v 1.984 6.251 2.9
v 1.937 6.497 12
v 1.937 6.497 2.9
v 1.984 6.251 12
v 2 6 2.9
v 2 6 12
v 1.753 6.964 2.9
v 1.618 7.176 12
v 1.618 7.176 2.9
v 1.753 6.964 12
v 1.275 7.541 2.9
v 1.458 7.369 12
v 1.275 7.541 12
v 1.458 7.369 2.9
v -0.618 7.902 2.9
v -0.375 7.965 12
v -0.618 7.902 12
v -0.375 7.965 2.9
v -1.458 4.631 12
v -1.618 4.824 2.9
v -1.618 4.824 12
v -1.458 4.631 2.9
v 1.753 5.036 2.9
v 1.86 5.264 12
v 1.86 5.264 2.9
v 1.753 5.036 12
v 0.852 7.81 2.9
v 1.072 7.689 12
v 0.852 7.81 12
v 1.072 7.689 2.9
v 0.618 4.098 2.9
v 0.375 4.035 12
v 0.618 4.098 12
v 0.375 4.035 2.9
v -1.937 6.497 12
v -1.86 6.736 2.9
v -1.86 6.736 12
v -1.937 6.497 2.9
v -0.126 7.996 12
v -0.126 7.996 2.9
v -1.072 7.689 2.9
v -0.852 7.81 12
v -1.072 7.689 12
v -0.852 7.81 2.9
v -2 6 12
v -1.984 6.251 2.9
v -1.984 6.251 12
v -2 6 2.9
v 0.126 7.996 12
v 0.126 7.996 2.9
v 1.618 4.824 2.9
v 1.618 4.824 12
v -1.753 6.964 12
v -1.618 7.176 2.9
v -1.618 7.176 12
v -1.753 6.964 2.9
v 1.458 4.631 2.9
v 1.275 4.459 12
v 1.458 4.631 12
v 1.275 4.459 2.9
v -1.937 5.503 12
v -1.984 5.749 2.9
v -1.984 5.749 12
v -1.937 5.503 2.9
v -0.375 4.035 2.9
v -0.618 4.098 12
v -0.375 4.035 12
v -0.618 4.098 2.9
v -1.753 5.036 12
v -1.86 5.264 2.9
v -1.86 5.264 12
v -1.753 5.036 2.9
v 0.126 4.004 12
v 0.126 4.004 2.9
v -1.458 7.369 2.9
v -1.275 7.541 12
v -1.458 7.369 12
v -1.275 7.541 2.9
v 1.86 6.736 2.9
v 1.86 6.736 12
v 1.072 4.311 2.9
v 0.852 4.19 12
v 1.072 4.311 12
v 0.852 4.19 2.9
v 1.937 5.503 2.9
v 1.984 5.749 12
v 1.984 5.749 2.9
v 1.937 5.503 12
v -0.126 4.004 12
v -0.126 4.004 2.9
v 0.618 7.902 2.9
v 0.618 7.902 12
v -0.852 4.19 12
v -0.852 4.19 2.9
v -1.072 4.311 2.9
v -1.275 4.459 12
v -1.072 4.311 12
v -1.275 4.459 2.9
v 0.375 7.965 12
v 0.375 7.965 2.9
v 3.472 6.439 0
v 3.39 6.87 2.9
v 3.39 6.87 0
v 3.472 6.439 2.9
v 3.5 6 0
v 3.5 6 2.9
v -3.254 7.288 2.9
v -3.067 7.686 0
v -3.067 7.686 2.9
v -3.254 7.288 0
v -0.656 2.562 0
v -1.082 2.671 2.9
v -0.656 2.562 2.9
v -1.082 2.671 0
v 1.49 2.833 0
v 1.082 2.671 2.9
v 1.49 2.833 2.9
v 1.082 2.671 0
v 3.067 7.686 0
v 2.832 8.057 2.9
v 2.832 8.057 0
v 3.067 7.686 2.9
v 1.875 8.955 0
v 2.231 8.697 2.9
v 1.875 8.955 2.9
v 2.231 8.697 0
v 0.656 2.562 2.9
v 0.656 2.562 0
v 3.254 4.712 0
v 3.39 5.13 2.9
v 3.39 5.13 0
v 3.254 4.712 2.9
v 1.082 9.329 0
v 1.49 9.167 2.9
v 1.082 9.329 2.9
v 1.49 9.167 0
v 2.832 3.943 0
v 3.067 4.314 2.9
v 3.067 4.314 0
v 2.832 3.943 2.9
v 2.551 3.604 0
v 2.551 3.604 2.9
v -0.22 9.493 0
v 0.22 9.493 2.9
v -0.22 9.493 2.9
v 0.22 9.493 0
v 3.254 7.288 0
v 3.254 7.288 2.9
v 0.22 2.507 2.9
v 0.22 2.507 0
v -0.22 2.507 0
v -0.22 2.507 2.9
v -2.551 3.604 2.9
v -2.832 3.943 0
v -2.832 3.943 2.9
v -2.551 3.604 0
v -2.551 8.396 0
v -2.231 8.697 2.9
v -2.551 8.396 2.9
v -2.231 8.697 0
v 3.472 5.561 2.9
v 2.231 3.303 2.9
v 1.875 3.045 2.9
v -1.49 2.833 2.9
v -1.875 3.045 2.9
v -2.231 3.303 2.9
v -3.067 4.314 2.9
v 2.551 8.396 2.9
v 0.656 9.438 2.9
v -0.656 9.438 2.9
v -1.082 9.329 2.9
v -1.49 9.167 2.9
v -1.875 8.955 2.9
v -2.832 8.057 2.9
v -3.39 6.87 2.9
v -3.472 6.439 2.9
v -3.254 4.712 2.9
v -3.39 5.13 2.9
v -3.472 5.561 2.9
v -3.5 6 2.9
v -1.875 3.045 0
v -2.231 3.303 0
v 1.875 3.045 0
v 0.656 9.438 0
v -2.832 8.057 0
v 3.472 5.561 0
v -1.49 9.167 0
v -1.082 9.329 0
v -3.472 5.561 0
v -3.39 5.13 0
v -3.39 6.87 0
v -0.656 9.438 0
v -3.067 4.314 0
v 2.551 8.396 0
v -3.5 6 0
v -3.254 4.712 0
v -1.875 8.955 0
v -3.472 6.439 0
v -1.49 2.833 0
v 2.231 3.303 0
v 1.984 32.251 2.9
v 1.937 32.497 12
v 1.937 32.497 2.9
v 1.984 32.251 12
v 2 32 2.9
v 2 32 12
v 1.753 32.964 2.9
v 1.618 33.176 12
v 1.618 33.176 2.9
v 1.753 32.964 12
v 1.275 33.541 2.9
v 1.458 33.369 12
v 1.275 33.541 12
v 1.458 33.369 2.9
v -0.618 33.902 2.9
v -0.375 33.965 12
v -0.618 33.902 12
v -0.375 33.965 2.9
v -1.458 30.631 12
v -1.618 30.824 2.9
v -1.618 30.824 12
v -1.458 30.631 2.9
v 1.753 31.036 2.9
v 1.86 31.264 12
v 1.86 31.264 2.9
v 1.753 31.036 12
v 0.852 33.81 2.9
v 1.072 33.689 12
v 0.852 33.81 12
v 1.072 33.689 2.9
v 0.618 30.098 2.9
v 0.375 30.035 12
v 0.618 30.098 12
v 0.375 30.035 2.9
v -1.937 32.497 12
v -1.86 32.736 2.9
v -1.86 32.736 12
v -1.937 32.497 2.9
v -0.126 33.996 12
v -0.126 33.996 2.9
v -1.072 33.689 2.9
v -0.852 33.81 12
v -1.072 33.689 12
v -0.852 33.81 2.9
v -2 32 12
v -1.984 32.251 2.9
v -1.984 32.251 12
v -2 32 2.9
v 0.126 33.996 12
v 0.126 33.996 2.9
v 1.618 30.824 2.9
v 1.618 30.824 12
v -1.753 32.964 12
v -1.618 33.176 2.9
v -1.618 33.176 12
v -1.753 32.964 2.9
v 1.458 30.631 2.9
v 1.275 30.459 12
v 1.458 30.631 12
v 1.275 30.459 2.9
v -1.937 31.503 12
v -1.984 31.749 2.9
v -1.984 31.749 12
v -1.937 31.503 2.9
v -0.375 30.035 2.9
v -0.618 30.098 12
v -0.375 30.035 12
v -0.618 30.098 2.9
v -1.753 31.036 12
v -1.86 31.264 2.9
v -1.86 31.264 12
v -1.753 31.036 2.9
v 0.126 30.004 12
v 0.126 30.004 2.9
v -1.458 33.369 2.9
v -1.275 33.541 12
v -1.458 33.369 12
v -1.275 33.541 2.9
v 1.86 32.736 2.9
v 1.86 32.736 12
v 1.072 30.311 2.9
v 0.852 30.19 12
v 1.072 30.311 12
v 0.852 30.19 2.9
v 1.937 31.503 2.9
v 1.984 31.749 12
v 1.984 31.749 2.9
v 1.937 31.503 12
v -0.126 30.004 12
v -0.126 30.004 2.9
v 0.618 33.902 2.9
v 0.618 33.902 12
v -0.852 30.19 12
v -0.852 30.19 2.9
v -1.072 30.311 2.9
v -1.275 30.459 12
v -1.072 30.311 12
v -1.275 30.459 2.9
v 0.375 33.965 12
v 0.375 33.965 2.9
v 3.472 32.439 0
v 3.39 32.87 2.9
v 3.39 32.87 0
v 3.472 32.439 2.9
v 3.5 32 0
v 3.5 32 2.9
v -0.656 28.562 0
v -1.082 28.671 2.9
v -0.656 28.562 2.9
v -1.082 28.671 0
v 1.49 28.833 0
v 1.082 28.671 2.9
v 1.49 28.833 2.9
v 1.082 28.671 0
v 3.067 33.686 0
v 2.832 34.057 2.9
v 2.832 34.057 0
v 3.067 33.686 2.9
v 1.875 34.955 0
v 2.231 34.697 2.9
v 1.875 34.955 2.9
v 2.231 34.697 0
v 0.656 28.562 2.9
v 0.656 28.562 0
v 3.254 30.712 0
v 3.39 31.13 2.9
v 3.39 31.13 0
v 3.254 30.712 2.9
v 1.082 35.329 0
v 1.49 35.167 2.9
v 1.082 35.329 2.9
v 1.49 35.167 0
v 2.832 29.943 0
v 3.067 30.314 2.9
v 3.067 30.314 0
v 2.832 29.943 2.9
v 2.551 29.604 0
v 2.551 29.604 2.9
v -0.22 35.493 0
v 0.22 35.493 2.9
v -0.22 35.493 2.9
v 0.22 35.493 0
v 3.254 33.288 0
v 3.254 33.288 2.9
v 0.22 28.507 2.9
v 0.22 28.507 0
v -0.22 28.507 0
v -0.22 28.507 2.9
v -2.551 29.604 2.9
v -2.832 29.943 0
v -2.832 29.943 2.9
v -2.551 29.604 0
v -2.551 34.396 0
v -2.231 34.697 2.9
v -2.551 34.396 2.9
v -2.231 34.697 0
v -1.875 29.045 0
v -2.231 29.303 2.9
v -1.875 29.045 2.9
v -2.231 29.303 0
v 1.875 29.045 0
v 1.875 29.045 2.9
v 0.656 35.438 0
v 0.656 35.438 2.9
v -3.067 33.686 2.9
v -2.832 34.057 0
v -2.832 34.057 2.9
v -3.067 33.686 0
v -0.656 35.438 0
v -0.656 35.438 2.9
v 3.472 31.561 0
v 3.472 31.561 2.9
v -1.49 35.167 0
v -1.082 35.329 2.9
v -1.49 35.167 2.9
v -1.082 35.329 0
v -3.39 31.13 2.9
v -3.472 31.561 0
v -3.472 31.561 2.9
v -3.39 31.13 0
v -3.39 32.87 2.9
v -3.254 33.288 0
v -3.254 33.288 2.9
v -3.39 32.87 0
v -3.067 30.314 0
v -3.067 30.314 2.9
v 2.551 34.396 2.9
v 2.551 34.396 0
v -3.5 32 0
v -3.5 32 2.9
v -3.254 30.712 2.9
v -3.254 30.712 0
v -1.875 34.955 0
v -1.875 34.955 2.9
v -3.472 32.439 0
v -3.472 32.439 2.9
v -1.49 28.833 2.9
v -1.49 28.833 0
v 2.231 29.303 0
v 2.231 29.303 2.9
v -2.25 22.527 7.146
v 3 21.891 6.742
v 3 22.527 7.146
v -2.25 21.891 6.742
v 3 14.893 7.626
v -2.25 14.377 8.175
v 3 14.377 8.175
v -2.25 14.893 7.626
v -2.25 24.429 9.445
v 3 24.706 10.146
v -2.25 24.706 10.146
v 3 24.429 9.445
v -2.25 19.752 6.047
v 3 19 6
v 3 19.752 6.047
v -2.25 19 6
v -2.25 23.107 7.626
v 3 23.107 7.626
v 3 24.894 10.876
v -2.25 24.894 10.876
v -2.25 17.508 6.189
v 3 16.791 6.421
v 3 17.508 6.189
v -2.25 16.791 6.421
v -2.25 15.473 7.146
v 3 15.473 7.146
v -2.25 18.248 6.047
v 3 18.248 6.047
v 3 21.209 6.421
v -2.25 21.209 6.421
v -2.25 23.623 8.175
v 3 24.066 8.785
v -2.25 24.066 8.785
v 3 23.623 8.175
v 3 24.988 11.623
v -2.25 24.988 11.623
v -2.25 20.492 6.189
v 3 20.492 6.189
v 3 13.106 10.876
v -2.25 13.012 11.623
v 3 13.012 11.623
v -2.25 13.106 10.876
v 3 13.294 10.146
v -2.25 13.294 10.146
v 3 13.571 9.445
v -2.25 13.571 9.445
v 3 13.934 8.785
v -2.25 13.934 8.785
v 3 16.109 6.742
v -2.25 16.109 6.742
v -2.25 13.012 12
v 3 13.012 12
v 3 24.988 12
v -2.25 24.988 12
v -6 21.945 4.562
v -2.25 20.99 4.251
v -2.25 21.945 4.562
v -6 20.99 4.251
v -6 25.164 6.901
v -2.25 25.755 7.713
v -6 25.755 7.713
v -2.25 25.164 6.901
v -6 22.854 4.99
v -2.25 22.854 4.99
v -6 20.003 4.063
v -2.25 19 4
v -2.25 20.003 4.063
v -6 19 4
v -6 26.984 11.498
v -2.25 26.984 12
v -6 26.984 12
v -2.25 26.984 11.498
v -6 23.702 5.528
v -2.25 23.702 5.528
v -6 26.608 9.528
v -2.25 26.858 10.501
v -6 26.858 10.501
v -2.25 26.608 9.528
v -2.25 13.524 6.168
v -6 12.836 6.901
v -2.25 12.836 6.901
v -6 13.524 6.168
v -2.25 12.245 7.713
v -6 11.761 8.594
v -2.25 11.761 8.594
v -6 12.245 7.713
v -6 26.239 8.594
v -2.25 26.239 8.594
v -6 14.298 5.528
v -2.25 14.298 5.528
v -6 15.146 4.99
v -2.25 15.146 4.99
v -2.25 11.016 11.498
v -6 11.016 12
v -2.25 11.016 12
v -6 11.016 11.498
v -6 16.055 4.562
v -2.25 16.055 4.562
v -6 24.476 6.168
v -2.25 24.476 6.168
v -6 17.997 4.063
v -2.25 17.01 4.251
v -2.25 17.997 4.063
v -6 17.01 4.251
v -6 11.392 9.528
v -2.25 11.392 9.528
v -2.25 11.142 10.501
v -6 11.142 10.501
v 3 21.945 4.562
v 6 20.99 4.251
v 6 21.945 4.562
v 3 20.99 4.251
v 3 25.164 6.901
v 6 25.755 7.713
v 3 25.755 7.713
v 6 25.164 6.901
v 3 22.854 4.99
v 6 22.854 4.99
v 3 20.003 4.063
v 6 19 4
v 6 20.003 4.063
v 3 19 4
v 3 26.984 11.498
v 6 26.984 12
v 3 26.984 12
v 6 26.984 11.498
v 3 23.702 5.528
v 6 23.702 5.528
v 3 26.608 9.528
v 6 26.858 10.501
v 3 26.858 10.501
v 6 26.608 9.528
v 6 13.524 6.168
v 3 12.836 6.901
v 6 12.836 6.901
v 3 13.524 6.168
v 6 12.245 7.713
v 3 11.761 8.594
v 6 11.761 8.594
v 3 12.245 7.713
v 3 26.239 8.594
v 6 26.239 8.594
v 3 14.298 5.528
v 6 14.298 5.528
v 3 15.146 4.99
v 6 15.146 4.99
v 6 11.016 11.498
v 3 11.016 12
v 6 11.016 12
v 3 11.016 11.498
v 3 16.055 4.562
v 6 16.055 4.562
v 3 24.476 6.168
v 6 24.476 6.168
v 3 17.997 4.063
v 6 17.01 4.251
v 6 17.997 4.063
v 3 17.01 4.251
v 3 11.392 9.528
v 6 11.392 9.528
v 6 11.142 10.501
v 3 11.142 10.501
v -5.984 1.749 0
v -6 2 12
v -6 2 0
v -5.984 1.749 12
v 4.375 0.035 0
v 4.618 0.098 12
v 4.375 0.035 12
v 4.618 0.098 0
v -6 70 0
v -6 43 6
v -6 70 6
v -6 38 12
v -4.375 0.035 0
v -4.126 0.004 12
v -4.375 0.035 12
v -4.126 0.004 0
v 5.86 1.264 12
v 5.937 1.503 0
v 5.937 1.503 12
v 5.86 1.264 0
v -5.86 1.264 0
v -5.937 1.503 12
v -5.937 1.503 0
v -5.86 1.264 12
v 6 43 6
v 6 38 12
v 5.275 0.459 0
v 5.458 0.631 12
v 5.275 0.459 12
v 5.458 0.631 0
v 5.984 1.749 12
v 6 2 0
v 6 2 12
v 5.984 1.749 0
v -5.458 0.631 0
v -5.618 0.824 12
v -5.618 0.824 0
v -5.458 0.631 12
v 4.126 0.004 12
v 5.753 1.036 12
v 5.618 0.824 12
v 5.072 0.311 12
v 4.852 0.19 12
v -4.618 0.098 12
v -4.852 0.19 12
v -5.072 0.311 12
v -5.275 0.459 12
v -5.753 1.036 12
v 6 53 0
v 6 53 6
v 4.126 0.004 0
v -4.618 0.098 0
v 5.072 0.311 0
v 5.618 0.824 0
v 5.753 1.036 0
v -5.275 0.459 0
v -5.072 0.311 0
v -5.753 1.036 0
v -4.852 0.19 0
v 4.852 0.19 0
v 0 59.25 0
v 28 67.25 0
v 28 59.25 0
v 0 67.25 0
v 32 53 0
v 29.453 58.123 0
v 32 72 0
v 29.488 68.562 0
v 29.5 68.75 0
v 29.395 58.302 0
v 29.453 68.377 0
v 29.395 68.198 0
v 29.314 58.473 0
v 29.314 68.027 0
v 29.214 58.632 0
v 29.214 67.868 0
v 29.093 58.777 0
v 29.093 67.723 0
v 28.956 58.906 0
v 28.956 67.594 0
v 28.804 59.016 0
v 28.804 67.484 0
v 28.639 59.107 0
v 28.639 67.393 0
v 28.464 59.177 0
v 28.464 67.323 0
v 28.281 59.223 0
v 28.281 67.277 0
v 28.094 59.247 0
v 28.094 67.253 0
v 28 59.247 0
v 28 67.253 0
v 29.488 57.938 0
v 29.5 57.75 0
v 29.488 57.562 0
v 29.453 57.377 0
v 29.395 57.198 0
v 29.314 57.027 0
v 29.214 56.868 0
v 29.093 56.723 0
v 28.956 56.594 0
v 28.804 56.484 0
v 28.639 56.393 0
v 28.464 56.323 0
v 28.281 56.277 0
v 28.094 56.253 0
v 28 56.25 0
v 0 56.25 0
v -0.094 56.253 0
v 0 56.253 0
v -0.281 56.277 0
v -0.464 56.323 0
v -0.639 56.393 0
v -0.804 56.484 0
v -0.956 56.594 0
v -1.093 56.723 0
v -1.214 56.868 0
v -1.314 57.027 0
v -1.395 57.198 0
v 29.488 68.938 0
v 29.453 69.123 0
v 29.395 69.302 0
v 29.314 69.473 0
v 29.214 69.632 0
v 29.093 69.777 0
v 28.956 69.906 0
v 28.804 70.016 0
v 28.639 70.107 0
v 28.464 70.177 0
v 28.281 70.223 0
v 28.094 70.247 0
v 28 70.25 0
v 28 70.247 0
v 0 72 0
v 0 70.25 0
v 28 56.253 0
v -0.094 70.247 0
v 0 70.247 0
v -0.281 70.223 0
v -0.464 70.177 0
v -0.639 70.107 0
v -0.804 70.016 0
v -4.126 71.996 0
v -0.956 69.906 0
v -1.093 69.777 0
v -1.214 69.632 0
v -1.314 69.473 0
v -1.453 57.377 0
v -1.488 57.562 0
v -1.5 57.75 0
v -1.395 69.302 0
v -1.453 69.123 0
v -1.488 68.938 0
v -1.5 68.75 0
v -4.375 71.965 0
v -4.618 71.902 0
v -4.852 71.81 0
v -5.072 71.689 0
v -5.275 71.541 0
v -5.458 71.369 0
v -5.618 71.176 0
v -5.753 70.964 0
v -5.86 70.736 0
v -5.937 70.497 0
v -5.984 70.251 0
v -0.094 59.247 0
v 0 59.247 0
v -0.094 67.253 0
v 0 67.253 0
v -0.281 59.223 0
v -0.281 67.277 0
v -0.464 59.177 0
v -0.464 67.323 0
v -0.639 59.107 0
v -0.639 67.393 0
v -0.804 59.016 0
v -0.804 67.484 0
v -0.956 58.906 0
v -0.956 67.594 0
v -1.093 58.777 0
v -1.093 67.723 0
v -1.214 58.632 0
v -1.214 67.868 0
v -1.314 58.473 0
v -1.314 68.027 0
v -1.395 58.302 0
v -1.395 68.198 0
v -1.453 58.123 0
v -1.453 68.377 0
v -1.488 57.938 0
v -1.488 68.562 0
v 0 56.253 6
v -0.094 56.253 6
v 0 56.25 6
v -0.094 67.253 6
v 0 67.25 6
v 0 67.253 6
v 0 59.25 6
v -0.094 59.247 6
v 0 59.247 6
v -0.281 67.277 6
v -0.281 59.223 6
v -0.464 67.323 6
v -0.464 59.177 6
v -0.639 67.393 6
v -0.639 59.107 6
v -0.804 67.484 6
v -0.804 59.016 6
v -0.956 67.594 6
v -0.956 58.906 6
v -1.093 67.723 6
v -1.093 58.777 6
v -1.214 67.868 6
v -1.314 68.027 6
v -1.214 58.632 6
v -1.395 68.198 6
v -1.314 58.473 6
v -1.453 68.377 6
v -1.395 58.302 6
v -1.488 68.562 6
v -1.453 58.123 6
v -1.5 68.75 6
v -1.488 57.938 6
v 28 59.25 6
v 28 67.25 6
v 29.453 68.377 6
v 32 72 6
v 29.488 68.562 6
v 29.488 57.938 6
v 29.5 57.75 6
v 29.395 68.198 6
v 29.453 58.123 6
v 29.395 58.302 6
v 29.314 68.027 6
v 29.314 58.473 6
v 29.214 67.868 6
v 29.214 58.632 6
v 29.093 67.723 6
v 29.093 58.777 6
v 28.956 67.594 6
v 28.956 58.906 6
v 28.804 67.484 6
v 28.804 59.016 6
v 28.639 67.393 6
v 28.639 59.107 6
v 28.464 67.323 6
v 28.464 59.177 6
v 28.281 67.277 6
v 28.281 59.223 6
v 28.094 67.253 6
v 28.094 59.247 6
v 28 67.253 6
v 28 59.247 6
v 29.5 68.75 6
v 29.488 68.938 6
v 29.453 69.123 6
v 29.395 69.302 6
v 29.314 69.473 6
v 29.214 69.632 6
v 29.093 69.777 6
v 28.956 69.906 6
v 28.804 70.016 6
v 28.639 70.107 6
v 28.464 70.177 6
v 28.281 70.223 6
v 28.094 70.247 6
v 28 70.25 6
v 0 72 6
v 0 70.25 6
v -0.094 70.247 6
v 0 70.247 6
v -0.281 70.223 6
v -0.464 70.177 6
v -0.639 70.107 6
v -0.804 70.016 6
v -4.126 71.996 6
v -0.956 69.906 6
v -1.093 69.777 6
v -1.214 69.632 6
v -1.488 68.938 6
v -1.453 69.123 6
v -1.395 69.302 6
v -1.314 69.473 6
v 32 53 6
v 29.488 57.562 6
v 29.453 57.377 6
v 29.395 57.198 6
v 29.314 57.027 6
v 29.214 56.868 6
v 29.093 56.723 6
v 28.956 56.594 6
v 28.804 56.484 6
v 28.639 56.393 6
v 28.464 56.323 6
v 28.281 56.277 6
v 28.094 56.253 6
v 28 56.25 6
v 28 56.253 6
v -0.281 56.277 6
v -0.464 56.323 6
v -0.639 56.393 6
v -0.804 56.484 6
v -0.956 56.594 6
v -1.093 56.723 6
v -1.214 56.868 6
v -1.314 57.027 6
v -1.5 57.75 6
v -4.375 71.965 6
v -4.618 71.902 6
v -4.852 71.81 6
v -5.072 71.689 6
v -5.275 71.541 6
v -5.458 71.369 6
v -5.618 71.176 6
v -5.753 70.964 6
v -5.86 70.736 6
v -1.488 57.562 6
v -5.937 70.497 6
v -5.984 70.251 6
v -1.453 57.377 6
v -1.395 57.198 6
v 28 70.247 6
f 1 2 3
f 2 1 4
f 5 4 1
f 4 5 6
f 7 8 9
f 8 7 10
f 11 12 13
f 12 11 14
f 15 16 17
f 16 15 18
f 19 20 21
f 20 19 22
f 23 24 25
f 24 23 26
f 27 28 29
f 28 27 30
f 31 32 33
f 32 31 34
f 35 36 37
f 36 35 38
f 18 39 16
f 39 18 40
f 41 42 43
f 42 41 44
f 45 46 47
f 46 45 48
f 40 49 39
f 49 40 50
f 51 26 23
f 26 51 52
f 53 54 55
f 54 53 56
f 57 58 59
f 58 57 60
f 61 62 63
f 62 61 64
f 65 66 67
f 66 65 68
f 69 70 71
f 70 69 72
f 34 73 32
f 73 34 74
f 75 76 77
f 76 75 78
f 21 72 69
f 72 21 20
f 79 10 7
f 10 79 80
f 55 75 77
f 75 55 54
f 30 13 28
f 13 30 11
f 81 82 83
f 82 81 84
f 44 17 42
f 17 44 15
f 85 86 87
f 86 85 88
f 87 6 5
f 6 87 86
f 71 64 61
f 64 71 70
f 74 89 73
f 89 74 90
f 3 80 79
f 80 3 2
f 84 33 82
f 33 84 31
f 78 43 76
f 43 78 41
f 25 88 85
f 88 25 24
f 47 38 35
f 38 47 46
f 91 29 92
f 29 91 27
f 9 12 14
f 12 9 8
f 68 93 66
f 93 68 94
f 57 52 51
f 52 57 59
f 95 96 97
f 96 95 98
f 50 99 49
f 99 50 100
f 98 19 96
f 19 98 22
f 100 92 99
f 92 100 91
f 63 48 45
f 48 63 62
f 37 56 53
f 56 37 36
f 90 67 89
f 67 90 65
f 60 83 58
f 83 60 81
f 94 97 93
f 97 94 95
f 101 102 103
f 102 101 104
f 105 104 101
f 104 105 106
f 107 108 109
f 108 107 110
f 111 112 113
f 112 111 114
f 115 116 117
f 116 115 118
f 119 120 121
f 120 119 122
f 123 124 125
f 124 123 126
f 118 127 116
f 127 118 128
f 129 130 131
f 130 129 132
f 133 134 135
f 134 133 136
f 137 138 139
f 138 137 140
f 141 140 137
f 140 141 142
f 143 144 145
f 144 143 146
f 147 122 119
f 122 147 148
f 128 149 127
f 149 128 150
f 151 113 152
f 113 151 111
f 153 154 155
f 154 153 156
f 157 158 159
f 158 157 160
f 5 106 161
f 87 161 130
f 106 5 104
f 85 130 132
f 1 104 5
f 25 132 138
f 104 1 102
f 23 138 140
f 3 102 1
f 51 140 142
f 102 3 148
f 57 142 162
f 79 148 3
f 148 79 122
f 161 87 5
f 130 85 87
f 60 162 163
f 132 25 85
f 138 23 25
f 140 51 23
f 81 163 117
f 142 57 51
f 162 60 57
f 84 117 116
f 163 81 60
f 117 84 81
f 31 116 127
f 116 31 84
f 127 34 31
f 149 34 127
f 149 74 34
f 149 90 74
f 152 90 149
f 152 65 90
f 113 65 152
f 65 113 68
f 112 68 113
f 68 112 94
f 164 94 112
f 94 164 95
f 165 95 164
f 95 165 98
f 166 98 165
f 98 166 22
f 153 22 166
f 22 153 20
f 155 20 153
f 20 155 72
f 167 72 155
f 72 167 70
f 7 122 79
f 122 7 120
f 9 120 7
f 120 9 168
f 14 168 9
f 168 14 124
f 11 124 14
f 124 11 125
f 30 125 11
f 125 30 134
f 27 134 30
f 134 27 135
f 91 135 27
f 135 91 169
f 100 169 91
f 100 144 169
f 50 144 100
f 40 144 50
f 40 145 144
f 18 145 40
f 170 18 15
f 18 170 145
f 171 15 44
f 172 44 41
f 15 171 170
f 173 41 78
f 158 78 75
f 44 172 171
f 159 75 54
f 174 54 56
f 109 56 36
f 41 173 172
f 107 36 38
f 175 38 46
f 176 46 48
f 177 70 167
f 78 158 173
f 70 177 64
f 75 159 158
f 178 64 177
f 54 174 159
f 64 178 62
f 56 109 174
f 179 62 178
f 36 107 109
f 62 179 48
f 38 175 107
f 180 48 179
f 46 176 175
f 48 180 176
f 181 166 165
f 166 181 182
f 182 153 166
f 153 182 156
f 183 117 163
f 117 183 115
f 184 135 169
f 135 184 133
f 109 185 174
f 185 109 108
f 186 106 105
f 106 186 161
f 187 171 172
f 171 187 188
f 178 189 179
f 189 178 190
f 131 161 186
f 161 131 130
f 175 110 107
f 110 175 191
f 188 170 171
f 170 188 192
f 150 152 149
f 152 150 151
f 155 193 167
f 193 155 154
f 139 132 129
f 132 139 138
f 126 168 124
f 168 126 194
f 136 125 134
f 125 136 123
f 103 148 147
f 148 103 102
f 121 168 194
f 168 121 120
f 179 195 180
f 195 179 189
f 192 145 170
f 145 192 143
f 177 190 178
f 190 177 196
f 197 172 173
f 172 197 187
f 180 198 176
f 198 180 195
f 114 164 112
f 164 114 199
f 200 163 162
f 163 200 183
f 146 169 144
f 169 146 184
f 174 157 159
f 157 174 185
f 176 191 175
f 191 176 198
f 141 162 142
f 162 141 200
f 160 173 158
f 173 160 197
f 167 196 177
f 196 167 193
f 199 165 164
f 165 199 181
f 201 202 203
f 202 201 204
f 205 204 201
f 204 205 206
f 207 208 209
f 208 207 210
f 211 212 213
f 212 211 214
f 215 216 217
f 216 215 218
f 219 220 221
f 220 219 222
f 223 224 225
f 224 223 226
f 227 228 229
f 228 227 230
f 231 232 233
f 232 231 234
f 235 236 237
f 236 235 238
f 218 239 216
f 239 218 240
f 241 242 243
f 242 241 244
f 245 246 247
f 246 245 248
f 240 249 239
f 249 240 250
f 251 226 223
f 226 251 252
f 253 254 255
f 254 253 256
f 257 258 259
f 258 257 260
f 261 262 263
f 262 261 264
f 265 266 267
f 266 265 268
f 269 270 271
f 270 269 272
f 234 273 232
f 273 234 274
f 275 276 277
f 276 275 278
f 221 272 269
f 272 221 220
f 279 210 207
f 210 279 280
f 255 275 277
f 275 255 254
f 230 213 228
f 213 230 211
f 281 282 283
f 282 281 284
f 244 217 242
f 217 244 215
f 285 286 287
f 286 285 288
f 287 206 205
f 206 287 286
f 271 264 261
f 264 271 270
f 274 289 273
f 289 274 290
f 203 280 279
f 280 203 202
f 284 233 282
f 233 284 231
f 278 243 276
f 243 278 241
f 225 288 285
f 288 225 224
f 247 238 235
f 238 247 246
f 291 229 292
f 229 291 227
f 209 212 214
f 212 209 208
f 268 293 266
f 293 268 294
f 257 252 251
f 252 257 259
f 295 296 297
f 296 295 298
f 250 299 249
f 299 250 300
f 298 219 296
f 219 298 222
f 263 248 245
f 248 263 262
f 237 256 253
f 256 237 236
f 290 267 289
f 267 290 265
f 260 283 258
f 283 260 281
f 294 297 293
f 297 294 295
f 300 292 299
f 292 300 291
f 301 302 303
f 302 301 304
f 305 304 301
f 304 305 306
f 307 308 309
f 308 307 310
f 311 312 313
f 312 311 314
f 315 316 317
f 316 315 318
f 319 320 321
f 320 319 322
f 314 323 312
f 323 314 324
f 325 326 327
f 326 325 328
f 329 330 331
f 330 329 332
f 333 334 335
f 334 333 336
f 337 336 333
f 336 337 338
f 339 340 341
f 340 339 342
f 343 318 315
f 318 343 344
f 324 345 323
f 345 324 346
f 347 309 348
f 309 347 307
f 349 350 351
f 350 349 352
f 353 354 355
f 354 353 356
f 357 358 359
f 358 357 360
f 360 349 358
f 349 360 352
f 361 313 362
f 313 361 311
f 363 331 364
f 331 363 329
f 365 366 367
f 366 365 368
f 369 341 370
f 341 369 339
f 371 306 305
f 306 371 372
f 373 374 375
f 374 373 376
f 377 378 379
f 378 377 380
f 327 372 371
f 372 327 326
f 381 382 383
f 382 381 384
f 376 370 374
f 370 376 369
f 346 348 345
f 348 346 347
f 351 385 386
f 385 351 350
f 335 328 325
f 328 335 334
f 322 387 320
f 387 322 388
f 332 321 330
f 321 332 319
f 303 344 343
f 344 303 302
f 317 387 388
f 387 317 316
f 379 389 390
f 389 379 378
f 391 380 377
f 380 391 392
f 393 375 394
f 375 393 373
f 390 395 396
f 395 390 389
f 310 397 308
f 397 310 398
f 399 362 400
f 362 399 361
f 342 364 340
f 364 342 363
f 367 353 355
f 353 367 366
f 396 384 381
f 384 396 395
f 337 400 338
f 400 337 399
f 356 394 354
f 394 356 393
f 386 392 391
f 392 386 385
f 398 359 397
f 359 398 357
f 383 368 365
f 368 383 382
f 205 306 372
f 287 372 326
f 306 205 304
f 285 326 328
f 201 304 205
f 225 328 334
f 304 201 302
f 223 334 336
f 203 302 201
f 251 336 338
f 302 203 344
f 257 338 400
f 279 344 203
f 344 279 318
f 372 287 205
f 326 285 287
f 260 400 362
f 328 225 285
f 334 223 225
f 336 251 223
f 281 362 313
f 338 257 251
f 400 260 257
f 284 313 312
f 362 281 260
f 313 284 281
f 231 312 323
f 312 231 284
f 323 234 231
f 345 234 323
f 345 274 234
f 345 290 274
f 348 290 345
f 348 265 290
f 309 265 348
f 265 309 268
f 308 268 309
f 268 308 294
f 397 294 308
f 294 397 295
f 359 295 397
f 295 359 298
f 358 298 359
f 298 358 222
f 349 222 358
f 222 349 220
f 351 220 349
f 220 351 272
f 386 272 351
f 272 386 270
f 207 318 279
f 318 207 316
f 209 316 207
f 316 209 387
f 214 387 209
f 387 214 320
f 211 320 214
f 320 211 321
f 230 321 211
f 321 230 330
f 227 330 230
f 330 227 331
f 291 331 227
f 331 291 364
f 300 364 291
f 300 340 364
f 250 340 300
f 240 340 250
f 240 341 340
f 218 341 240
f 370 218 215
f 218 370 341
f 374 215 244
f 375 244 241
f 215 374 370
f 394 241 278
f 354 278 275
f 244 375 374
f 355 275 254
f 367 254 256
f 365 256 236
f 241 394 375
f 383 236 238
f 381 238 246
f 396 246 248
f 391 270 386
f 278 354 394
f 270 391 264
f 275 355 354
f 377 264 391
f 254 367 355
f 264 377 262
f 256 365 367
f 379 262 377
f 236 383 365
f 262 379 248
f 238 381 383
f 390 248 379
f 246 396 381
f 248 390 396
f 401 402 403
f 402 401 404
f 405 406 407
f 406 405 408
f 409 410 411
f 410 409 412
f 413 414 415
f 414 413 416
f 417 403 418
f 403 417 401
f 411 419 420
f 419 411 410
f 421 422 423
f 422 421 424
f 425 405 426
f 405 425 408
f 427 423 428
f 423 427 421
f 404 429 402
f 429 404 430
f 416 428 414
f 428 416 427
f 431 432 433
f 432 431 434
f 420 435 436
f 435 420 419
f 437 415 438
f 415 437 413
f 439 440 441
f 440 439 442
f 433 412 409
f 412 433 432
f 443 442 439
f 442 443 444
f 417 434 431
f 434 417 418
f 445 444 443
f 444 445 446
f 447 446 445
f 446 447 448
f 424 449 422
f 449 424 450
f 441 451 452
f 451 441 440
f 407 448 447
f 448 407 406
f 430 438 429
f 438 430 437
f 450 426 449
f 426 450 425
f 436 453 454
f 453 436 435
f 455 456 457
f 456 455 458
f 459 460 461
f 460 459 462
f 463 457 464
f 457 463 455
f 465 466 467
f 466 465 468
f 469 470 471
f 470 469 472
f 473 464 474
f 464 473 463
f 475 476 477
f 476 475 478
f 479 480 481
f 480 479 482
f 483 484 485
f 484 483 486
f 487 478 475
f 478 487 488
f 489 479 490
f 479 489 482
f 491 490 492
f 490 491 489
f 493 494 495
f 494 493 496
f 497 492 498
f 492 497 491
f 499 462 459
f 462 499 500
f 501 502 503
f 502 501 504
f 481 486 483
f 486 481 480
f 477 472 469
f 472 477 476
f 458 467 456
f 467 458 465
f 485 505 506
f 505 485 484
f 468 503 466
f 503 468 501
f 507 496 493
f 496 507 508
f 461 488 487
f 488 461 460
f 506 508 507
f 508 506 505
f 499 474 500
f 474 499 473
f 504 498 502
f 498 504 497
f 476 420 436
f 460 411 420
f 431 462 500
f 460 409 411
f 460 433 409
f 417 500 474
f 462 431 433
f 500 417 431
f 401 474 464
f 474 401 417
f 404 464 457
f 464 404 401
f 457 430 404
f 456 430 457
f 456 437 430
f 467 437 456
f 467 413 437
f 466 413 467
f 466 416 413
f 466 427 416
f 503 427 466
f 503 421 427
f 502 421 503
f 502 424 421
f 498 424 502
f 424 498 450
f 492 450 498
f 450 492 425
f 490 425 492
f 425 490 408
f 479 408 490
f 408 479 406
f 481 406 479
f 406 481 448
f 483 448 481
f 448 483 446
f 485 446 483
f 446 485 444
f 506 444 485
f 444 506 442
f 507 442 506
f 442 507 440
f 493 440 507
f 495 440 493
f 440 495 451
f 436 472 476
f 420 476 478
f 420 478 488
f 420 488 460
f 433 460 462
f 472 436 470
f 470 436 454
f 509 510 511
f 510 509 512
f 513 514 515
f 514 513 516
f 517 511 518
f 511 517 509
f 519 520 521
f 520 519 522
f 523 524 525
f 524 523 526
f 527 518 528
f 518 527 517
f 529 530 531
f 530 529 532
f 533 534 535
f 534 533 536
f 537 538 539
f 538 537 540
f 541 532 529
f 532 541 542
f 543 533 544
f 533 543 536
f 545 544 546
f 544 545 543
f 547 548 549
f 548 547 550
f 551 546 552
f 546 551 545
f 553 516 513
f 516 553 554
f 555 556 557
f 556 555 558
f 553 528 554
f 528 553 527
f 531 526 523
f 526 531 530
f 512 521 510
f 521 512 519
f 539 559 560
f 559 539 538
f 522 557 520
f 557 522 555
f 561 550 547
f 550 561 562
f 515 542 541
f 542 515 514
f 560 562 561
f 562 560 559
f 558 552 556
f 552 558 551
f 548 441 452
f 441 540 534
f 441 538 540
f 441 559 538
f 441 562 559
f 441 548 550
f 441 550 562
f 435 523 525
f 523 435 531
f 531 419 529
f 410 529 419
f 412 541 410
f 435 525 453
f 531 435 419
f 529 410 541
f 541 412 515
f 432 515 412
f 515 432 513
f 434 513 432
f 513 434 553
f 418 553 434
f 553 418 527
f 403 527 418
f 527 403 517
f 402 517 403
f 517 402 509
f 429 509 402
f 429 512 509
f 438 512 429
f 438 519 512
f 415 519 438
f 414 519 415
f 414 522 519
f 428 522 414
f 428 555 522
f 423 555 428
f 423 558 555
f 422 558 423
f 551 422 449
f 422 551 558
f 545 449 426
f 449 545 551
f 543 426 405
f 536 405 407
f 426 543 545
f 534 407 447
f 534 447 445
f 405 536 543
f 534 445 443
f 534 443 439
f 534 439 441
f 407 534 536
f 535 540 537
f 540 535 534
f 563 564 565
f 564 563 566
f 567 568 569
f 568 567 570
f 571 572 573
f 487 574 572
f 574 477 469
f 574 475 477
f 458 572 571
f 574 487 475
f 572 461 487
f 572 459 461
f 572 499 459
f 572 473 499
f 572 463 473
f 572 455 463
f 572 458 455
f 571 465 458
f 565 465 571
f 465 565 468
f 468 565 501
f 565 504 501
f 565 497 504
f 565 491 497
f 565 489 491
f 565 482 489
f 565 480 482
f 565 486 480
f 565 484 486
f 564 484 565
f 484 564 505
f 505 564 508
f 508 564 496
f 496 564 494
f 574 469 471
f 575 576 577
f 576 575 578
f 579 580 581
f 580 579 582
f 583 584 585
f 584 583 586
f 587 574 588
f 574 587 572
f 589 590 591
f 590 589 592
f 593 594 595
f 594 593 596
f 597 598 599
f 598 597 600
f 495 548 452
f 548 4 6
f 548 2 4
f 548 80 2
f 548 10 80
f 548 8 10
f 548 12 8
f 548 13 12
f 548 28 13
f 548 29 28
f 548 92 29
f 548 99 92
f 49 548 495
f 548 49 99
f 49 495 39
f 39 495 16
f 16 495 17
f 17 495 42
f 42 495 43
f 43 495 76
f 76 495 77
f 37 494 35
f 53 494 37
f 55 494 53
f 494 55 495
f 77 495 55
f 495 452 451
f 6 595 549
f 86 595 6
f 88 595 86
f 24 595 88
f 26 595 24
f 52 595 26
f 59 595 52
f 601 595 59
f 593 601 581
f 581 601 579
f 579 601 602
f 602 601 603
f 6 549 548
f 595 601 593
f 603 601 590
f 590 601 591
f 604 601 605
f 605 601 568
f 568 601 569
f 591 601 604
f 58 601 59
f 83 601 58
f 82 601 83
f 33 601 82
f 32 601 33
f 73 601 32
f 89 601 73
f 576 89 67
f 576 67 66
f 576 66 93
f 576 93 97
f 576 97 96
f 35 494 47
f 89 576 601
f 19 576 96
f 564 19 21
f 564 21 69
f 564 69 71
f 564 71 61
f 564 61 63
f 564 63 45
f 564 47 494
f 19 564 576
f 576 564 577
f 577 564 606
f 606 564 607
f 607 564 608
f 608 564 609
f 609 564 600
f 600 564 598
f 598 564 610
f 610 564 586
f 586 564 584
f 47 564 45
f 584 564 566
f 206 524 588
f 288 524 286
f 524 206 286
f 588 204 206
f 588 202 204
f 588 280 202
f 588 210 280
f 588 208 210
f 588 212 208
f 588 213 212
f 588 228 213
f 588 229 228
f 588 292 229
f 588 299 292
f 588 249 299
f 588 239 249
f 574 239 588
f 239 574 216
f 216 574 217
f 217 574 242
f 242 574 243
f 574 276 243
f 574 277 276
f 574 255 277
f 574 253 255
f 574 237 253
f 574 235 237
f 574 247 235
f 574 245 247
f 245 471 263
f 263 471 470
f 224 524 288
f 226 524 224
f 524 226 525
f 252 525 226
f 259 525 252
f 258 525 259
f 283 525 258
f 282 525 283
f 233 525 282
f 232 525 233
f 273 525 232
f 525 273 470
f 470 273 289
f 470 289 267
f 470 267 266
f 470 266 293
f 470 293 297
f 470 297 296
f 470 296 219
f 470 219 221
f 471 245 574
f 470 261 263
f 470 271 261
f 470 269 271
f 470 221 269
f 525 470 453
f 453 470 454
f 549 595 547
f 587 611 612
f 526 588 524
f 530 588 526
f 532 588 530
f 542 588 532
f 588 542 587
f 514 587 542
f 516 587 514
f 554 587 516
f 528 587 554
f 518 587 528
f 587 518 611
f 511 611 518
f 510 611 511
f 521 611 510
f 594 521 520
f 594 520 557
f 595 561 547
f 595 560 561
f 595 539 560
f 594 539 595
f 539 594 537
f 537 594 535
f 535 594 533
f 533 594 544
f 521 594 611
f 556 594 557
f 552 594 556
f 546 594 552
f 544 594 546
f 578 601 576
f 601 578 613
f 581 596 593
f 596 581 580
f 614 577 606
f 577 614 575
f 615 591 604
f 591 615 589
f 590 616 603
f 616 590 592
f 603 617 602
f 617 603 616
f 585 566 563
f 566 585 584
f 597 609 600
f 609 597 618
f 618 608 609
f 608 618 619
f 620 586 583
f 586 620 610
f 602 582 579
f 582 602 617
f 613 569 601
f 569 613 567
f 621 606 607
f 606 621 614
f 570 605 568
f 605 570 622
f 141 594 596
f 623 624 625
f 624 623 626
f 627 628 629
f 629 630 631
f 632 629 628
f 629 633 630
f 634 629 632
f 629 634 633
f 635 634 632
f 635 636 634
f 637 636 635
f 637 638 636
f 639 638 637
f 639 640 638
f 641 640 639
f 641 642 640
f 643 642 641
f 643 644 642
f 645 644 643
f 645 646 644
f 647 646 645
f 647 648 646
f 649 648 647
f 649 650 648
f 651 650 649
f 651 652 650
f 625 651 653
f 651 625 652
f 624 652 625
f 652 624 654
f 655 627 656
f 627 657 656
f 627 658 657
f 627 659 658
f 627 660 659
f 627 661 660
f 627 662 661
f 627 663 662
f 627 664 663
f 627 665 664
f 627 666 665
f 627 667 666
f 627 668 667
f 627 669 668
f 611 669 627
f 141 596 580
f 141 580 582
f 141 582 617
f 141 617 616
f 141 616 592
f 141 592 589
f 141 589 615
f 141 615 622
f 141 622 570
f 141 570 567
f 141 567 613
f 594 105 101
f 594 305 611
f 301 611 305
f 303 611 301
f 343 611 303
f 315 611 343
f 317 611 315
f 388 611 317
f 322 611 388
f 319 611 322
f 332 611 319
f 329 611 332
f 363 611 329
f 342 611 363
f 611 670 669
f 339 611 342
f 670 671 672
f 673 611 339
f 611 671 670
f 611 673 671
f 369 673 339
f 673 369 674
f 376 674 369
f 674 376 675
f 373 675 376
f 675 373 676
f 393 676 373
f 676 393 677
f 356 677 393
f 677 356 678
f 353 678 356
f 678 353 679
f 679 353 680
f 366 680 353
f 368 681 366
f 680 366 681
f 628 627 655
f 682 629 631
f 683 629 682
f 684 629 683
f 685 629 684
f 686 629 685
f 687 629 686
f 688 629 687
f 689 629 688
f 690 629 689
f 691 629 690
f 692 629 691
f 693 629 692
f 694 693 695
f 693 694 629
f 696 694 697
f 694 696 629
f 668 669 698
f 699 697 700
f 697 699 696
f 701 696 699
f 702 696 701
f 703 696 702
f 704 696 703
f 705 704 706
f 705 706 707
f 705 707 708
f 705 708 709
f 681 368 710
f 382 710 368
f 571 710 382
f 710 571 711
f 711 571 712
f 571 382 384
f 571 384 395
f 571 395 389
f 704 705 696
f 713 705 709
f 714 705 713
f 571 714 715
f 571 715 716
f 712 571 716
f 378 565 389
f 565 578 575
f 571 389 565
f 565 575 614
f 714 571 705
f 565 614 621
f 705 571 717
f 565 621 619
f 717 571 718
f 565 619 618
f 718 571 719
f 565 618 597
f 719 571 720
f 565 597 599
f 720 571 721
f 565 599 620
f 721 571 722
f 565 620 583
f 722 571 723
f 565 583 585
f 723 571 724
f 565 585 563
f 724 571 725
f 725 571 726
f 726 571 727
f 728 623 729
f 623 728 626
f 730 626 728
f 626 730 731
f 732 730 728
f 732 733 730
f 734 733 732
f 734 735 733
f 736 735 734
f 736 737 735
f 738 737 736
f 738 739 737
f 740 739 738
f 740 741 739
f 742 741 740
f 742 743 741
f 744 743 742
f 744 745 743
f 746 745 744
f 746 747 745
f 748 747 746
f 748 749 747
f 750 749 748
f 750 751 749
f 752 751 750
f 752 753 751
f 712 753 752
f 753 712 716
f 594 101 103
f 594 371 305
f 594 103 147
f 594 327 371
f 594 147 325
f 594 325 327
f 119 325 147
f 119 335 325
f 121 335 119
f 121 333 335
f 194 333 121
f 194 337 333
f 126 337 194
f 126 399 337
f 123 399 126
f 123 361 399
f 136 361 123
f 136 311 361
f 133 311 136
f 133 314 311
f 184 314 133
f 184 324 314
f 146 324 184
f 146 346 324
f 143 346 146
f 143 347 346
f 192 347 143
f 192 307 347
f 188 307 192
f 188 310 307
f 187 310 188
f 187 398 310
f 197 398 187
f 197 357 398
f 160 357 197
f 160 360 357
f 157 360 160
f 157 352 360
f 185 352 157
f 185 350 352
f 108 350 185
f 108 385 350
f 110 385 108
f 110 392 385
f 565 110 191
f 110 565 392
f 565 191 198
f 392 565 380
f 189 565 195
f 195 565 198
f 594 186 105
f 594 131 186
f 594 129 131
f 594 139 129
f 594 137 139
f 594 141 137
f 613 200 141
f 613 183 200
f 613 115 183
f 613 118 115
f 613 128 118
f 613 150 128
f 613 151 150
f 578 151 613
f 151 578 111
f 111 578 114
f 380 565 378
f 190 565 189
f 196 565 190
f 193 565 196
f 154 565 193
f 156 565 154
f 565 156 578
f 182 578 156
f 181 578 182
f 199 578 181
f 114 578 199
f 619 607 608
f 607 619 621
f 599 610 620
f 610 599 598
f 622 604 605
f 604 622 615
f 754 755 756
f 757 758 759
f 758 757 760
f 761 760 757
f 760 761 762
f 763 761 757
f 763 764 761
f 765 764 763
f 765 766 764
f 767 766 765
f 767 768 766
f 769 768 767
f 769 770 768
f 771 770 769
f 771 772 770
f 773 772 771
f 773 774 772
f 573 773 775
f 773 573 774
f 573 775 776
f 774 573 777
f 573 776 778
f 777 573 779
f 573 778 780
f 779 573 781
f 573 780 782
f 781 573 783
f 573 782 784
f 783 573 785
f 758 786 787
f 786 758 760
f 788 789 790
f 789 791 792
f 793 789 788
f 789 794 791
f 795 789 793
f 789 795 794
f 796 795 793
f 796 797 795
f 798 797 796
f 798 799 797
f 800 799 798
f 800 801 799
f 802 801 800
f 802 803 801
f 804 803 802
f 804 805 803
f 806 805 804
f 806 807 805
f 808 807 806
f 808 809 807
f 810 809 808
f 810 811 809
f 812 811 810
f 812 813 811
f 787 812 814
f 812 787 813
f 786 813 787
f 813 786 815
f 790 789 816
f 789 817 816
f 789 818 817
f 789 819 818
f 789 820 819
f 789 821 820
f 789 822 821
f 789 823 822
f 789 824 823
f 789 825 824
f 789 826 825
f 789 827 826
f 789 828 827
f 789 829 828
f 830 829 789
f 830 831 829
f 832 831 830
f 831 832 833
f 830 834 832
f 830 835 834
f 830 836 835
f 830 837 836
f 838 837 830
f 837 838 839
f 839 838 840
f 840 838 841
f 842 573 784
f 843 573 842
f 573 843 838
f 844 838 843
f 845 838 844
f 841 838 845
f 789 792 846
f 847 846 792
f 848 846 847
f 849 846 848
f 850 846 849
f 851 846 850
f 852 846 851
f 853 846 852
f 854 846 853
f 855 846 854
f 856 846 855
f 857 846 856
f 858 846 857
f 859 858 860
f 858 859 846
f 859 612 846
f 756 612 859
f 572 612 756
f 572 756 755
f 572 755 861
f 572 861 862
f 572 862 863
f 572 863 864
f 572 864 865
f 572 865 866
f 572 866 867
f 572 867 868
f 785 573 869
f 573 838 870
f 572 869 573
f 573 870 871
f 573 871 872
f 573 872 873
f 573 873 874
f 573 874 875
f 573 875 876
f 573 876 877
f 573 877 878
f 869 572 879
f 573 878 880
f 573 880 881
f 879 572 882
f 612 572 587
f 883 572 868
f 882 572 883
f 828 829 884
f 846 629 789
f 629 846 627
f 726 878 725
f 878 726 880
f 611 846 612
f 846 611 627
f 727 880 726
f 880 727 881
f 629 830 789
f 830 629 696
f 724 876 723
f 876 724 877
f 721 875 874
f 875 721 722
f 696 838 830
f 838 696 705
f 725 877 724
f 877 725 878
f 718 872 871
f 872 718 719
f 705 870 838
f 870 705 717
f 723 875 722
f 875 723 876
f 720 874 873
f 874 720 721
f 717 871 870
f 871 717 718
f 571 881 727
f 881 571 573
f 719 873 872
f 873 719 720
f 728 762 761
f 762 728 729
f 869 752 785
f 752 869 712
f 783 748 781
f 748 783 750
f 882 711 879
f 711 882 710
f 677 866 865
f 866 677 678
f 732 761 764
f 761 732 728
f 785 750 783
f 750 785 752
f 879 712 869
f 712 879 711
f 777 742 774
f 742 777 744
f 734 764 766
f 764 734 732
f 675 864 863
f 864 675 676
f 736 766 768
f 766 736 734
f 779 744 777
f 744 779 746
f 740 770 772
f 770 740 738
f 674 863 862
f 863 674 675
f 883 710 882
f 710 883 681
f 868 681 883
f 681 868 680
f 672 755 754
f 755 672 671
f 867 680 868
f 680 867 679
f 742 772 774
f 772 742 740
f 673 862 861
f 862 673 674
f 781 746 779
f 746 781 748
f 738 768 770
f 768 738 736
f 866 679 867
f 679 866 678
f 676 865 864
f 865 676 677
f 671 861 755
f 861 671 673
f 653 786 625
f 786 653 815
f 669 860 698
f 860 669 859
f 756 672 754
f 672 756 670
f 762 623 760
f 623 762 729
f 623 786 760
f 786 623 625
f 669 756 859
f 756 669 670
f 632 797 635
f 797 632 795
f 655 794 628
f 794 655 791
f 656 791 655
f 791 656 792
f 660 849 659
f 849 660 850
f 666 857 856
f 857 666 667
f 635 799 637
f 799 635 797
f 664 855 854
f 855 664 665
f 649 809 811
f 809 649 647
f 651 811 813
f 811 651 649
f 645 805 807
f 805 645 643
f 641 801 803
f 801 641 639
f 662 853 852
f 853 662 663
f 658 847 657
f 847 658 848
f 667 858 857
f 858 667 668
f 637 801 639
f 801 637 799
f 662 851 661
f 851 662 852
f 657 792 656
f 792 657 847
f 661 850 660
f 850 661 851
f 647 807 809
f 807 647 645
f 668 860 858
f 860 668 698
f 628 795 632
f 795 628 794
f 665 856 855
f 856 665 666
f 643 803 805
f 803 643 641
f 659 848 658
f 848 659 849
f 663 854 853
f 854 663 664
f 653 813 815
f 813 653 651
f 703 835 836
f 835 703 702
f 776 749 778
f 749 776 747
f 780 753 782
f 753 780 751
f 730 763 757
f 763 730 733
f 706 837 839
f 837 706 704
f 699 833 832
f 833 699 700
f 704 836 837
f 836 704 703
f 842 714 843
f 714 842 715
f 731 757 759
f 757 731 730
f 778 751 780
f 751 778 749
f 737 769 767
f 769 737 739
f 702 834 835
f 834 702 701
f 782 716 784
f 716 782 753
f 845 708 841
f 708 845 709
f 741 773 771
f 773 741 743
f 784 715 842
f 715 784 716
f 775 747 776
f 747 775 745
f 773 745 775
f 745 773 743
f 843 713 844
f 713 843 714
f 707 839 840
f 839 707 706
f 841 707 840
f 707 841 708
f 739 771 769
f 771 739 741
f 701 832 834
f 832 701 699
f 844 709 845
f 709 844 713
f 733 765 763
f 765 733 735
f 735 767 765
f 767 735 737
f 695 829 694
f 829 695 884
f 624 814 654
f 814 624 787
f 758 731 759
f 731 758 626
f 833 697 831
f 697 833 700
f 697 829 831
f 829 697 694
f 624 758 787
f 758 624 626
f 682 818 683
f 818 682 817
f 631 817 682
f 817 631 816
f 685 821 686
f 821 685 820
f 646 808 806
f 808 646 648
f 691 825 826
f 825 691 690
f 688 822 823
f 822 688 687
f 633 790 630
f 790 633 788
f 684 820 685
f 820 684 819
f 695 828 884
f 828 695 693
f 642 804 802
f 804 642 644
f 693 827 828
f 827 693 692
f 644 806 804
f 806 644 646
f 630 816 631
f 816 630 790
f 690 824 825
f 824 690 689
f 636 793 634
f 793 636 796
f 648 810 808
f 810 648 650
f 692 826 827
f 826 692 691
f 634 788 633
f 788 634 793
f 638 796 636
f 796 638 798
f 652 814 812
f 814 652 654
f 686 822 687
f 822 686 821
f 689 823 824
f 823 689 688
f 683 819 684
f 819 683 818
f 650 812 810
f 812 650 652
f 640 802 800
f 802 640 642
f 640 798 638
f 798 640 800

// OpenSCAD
/********************************************************************
 * Author: Mekatrol
 * http://www.thingiverse.com/mekatrol
 *
 * Thanks to TECH2C:
 * http://www.thingiverse.com/Tech2C	
 * https://www.youtube.com/channel/UC_scf0U4iSELX22nC60WDSg
 *
 * NOTES:
 * 	1. All dimensions are in mm (millimetres).
 *  2. Hulls are used to form complex shapes. Change the hull keyword 
 *     to union to see the primitive shapes for debugging.
 *
 ********************************************************************/

// Made of of 3 sections:
// 1. The extruder clamp. 
//    This is the section that clamps to the 
//    Tech2C extruder mount (throat clamp).
//
// 2. Sensor mount.
//    This section containes the send platform and hole.
//
// 3. Connector section.
//    This section connects the extruder clamp
//    to the sensor mount (connects sections 1 & 2).

/*********************************************************
 * Global variables.
 *********************************************************/

// Increase this value to improve 'roundness' resoultion.
$fn = 50;

// Type of sensor mount 
// 1 = circular 
// 2 = Block type 
sensorMountType = 2;

// Set the nominal diameter of the sensor body.
sensorDiameter = 12;

// The multiplier user to make sure extrude cuts
// go all the way through a solid.
extrudeCutFactor = 0.1;

// The diameters of the extruder throat.
smallThroatDiameter = 12;
largeThroatDiameter = 16;

// Clamp screw dimensions
clampScrewDiameter = 4;
clampScrewCenterOffset = 13;
clampScrewRim = 3;
// Hieght of the screw head
clampScrewHeight = 3;

// The cut depths for the large throat diameters.
topThroatCutDepth = 3.75;
bottomThroatCutDepth = 3;

// Width, height of the clamp section.
clampSectionWidth = 12;  // X size
clampSectionLength = 38; // Y size 
clampSectionHeight = 12; // Z size

// Length of angled section in the Y dimension.
clampAngleFaceLength = 5; // Y size

// Sensor mount sizes
sensorMountWidth = clampSectionHeight / 2; // X size
sensorMountLength = 25; // Y size
sensorMountHeight = 32.5; // Z size

blockSensorMountExtraWidth = 10;
blockSensorHoleDist = 11;
blockSensorRimSize = 5;

// Sensor corner radiuses.
cornerMajorRadius = 12;
cornerMinorRadius = 6;		

// Offset of sensor hole from bottom of mount.
sensorHoleOffset = 20.5;

// The radius of major corners.
cornerRadius = 2;

// The connector section size
connectorSectionWidth = 38; // X size
connectorSectionLength = 12;  // Y size 

connectorSectionHeight = sensorMountWidth; // Z size

// Connector hole sizes
connectorHoleDiameter = 3;
connectorHoleOffset = 7.5;

// Size of bevel between sensor mount section and
// connector section.
bevelSize = 5;

/*********************************************************
 * Section construction.
 *********************************************************/


union()
{
	ExtruderClampSection();
    if (sensorMountType == 1) {
        SensorMountSection();
        ConnectorSection();
    } else {
        BlockConnectorSection();
    }
	
}

module ExtruderClampSection()
{
	// Section body.	
	difference()
	{
		// Solid section
		hull()
		{
			// Rounded corner 1
			translate([
				-clampSectionWidth / 2 + cornerRadius, 
				 cornerRadius, 0]) 
			{	
				cylinder(
					r = cornerRadius, 
					h = clampSectionHeight);
			}
			
			// Rounded corner 2
			translate([
				+clampSectionWidth / 2 - cornerRadius, 
				 cornerRadius, 0]) 
			{
				cylinder(
					r = cornerRadius, 
					h = clampSectionHeight);
			}
			
			// Section body cube
			translate([
				-clampSectionWidth / 2, 
				cornerRadius, 0])
			{
				cube(size = [
					clampSectionWidth, 
					clampSectionLength - cornerRadius, 
					clampSectionHeight]);
			}

			// Section between clamp and connector section.
			translate([0, clampSectionLength, 0])
			{
				rotate([0, -90, 0])
				{
					// Angled face section to connector.
					linear_extrude(
						height = clampSectionWidth, 
						center = true)
					{
						polygon(points = [
							[0, 0],
							[clampSectionHeight, 0],
							[clampSectionHeight / 2, clampAngleFaceLength],
							[0,  clampAngleFaceLength]
						]);
					}
				}
			}
		}
		
		union()
		{
			// Clamp screw hole 1.
			translate([
				0, 
				clampSectionLength / 2 - clampScrewCenterOffset, 
				-extrudeCutFactor])
				{
					cylinder(
						d = clampScrewDiameter,
						h = clampSectionHeight + 2 * extrudeCutFactor);
                    cylinder(
						d = clampScrewDiameter + clampScrewRim,
						h = clampScrewHeight );
			}
			
			// Clamp screw hole 2.
			translate([
				0, 
				clampSectionLength / 2 + clampScrewCenterOffset, 
				-extrudeCutFactor])
				{
					cylinder(
						d = clampScrewDiameter,
						h = clampSectionHeight + 2 * extrudeCutFactor);
                    cylinder(
						d = clampScrewDiameter + clampScrewRim,
						h = clampScrewHeight );
			}

			// Small throat diameter hole.
			translate([
				0,
				clampSectionLength / 2,
				clampSectionHeight])
				{
					rotate([0, 90, 0])
					{
						cylinder(
							d = smallThroatDiameter,
							h = clampSectionWidth + 2 * extrudeCutFactor,
							center = true);
				}
			}
			
			// Large throat diameter top extrude cut.
			topExtrudeSize = topThroatCutDepth + 2 * extrudeCutFactor;
			translate([
				-clampSectionWidth / 2 - 
					(topExtrudeSize - topThroatCutDepth),
				clampSectionLength / 2,
				clampSectionHeight])
				{
					rotate([0, 90, 0])
					{
						cylinder(
							d = largeThroatDiameter,
							h = topExtrudeSize);
				}
			}

			// Large throat diameter bottom extrude cut.
			translate([
				clampSectionWidth / 2 - bottomThroatCutDepth, 
				clampSectionLength / 2, 
				clampSectionHeight])
				{
					rotate([0, 90, 0])
					{
						cylinder(
							d = largeThroatDiameter,
							h = bottomThroatCutDepth + 2 * extrudeCutFactor);
				}
			}
		}
	}
}

module SensorMountSection()
{
    // Bevel to sensor platform
    translate([
        connectorSectionWidth - 
            bevelSize, 
    
        clampSectionLength +
            clampAngleFaceLength +
            connectorSectionLength / 2, 
    
        connectorSectionHeight])
    {
        rotate([90, -90, 0])
        {
            // Angled face section to connector.
            linear_extrude(
                height = connectorSectionLength, 
                center = true)
            {
                polygon(points = [
                    [0, 0],
                    [bevelSize, 0],
                    [0, bevelSize]
                ]);
            }
        }
    }
	difference()
	{	
		hull()
		{
			// Top large rounded corner 1
			translate([
				connectorSectionWidth - clampSectionWidth / 2, 
			
				clampSectionLength + 
					clampAngleFaceLength - 
					sensorMountLength / 2 + 
					connectorSectionLength / 2 +
					cornerMajorRadius, 
			
				sensorMountHeight - cornerMajorRadius])
			{
				rotate([0, 90, 0])
				{
					cylinder(
						r = cornerMajorRadius,
						h = sensorMountWidth);
				}
			}

			// Top large rounded corner 2
			translate([
				connectorSectionWidth - 
					clampSectionWidth / 2,
			
				clampSectionLength +
					clampAngleFaceLength -
					sensorMountLength / 2 +
					connectorSectionLength / 2 +
					sensorMountLength -
					cornerMajorRadius,
			
				sensorMountHeight - cornerMajorRadius])
			{
				rotate([0, 90, 0])
				{
					cylinder(
						r = cornerMajorRadius,
						h = sensorMountWidth);
				}
			}

			// Bottom small rounded corner 1
			translate([
				connectorSectionWidth - 
					clampSectionWidth / 2,
				
				clampSectionLength +
					clampAngleFaceLength -
					sensorMountLength / 2 +
					connectorSectionLength / 2 +
					cornerMinorRadius,
				
				cornerMinorRadius])
			{
				rotate([0, 90, 0])
				{
					cylinder(
						r = cornerMinorRadius,
						h = sensorMountWidth);
				}
			}

			// Bottom small rounded corner 2
			translate([
				connectorSectionWidth - clampSectionWidth / 2,
				clampSectionLength +
					clampAngleFaceLength -
					sensorMountLength / 2 +
					connectorSectionLength / 2 +
					sensorMountLength -
					cornerMinorRadius,
				cornerMinorRadius])
			{
				rotate([0, 90, 0])
				{
					cylinder(
						r = cornerMinorRadius,
						h = sensorMountWidth);
				}
			}
		}

		union()
		{
			// Sensor hole.
			translate([
				connectorSectionWidth -
				clampSectionWidth / 2 -
				+extrudeCutFactor,

				clampSectionLength + 
					clampAngleFaceLength - 
					sensorMountLength / 2 + 
					connectorSectionLength / 2 +
					sensorMountLength -
					sensorDiameter, 

				sensorHoleOffset])
			{
				rotate([0, 90, 0])
				{
					cylinder(
						d = sensorDiameter,
						h = sensorMountWidth + 2 * extrudeCutFactor);
				}
			}
		}
	}
}

module ConnectorSection()
{

	difference()
	{		
		union()
		{
			hull()
			{
				// Large cube area
				translate([
					0,
					clampSectionLength + clampAngleFaceLength,
					0])
				{
					if (sensorMountType == 1) {
                    cube(size = [
						connectorSectionWidth  - clampSectionWidth / 2,
						connectorSectionLength, 
						connectorSectionHeight]);
                    } else {
                        cube(size = [
						connectorSectionWidth  - clampSectionWidth / 2,
						connectorSectionBlockLength, 
						connectorSectionHeight]);
                    }
				}		

				// Small cube area
				translate([
					-clampSectionWidth / 2,
					clampSectionLength + clampAngleFaceLength,
					0])
				{
					cube(size = [
						clampSectionWidth / 2,
						connectorSectionLength / 2,
						connectorSectionHeight]);
				}

				// Rounded corner
				translate([
					-clampSectionWidth / 2 + cornerRadius,
					 clampSectionLength +
						clampAngleFaceLength +
						connectorSectionLength - cornerRadius,
					 0])
				{
					cylinder(
						r = cornerRadius, 
						h = connectorSectionHeight);
				}
			}
			
			
		}
		
		union()
		{
			// Connector hole 1.
			translate([
				0,
				clampSectionLength +
					clampAngleFaceLength +
					connectorSectionLength / 2,
				-extrudeCutFactor])
			{
				cylinder(
					d = connectorHoleDiameter,
					h = connectorSectionHeight +
						2 * extrudeCutFactor);
			}
            if (sensorMountType == 1) {
                // Connector hole 2.
                translate([
                    connectorHoleOffset,
                    clampSectionLength +
                        clampAngleFaceLength +
                        connectorSectionLength / 2,
                    -extrudeCutFactor])
                {
                    cylinder(
                        d = connectorHoleDiameter,
                        h = connectorSectionHeight +
                            2 * extrudeCutFactor);
                }

                // Connector hole 3.
                translate([
                    connectorHoleOffset * 2,
                    clampSectionLength +
                        clampAngleFaceLength +
                        connectorSectionLength / 2,
                    -extrudeCutFactor])
                {
                    cylinder(
                        d = connectorHoleDiameter,
                        h = connectorSectionHeight +
                            2 * extrudeCutFactor);
                }
            } else {
                // Connector slot
                translate([
				0,
				clampSectionLength +
					clampAngleFaceLength +
					(connectorSectionLength / 2)-(connectorHoleDiameter / 2),
				-extrudeCutFactor])
                {
                    cube(size=[connectorHoleOffset * 3,connectorHoleDiameter,connectorSectionHeight+1]);
                }
            }

			// Connector hole 4.
			translate([
				connectorHoleOffset * 3,
				clampSectionLength + 
					clampAngleFaceLength +
					connectorSectionLength / 2,
				-extrudeCutFactor])
			{
				cylinder(
					d = connectorHoleDiameter,
					h = connectorSectionHeight +
						2 * extrudeCutFactor);
			}
		}
	}
}

module BlockConnectorSection()
{

	difference()
	{		
        connectorSectionBlockLength = blockSensorHoleDist + connectorHoleDiameter + blockSensorRimSize;
		union()
		{
            translate([
					-clampSectionWidth / 2,
					clampSectionLength + clampAngleFaceLength ,
					0])
				{
                    cube(size = [
						clampSectionWidth,
						connectorSectionBlockLength / 2 + blockSensorMountExtraWidth,
						connectorSectionHeight]);
                }
			hull()
			{
				// Large cube area
				translate([
					0,
					clampSectionLength + clampAngleFaceLength +blockSensorMountExtraWidth,
					0])
				{
                        cube(size = [
						connectorSectionWidth  - clampSectionWidth / 2,
						connectorSectionBlockLength, 
						connectorSectionHeight]);
				}		

				// Small cube area
				translate([
					-clampSectionWidth / 2,
					clampSectionLength + clampAngleFaceLength +blockSensorMountExtraWidth,
					0])
				{
					cube(size = [
						clampSectionWidth,
						connectorSectionBlockLength / 2 ,
						connectorSectionHeight]);
				}

				// Rounded corner
				translate([
					-clampSectionWidth / 2 + cornerRadius,
					 clampSectionLength +
						clampAngleFaceLength +
						connectorSectionBlockLength - cornerRadius + blockSensorMountExtraWidth,
					 0])
				{
					cylinder(
						r = cornerRadius, 
						h = connectorSectionHeight);
				}
			}
			
			
		}
        slot(clampSectionLength +
                clampAngleFaceLength +
                connectorSectionBlockLength / 4 + blockSensorMountExtraWidth);
        slot(clampSectionLength +
                clampAngleFaceLength +
                connectorSectionBlockLength / 4 + blockSensorMountExtraWidth + blockSensorHoleDist);
	}
}

module slot(x_pos) {
    union()
    {
        // Connector hole 1.
        translate([
            0,
            x_pos,
            -extrudeCutFactor])
        {
            cylinder(
                d = connectorHoleDiameter,
                h = connectorSectionHeight +
                    2 * extrudeCutFactor);
        }
        
        // Connector slot
        translate([
        0,
        x_pos-(connectorHoleDiameter / 2),
        -extrudeCutFactor])
        {
            cube(size=[clampSectionLength-blockSensorMountExtraWidth,connectorHoleDiameter,connectorSectionHeight+1]);
        }
    }

    // Connector hole 4.
    translate([
        clampSectionLength-blockSensorMountExtraWidth,
        x_pos,
        -extrudeCutFactor])
    {
        cylinder(
            d = connectorHoleDiameter,
            h = connectorSectionHeight +
                2 * extrudeCutFactor);
    }
}
